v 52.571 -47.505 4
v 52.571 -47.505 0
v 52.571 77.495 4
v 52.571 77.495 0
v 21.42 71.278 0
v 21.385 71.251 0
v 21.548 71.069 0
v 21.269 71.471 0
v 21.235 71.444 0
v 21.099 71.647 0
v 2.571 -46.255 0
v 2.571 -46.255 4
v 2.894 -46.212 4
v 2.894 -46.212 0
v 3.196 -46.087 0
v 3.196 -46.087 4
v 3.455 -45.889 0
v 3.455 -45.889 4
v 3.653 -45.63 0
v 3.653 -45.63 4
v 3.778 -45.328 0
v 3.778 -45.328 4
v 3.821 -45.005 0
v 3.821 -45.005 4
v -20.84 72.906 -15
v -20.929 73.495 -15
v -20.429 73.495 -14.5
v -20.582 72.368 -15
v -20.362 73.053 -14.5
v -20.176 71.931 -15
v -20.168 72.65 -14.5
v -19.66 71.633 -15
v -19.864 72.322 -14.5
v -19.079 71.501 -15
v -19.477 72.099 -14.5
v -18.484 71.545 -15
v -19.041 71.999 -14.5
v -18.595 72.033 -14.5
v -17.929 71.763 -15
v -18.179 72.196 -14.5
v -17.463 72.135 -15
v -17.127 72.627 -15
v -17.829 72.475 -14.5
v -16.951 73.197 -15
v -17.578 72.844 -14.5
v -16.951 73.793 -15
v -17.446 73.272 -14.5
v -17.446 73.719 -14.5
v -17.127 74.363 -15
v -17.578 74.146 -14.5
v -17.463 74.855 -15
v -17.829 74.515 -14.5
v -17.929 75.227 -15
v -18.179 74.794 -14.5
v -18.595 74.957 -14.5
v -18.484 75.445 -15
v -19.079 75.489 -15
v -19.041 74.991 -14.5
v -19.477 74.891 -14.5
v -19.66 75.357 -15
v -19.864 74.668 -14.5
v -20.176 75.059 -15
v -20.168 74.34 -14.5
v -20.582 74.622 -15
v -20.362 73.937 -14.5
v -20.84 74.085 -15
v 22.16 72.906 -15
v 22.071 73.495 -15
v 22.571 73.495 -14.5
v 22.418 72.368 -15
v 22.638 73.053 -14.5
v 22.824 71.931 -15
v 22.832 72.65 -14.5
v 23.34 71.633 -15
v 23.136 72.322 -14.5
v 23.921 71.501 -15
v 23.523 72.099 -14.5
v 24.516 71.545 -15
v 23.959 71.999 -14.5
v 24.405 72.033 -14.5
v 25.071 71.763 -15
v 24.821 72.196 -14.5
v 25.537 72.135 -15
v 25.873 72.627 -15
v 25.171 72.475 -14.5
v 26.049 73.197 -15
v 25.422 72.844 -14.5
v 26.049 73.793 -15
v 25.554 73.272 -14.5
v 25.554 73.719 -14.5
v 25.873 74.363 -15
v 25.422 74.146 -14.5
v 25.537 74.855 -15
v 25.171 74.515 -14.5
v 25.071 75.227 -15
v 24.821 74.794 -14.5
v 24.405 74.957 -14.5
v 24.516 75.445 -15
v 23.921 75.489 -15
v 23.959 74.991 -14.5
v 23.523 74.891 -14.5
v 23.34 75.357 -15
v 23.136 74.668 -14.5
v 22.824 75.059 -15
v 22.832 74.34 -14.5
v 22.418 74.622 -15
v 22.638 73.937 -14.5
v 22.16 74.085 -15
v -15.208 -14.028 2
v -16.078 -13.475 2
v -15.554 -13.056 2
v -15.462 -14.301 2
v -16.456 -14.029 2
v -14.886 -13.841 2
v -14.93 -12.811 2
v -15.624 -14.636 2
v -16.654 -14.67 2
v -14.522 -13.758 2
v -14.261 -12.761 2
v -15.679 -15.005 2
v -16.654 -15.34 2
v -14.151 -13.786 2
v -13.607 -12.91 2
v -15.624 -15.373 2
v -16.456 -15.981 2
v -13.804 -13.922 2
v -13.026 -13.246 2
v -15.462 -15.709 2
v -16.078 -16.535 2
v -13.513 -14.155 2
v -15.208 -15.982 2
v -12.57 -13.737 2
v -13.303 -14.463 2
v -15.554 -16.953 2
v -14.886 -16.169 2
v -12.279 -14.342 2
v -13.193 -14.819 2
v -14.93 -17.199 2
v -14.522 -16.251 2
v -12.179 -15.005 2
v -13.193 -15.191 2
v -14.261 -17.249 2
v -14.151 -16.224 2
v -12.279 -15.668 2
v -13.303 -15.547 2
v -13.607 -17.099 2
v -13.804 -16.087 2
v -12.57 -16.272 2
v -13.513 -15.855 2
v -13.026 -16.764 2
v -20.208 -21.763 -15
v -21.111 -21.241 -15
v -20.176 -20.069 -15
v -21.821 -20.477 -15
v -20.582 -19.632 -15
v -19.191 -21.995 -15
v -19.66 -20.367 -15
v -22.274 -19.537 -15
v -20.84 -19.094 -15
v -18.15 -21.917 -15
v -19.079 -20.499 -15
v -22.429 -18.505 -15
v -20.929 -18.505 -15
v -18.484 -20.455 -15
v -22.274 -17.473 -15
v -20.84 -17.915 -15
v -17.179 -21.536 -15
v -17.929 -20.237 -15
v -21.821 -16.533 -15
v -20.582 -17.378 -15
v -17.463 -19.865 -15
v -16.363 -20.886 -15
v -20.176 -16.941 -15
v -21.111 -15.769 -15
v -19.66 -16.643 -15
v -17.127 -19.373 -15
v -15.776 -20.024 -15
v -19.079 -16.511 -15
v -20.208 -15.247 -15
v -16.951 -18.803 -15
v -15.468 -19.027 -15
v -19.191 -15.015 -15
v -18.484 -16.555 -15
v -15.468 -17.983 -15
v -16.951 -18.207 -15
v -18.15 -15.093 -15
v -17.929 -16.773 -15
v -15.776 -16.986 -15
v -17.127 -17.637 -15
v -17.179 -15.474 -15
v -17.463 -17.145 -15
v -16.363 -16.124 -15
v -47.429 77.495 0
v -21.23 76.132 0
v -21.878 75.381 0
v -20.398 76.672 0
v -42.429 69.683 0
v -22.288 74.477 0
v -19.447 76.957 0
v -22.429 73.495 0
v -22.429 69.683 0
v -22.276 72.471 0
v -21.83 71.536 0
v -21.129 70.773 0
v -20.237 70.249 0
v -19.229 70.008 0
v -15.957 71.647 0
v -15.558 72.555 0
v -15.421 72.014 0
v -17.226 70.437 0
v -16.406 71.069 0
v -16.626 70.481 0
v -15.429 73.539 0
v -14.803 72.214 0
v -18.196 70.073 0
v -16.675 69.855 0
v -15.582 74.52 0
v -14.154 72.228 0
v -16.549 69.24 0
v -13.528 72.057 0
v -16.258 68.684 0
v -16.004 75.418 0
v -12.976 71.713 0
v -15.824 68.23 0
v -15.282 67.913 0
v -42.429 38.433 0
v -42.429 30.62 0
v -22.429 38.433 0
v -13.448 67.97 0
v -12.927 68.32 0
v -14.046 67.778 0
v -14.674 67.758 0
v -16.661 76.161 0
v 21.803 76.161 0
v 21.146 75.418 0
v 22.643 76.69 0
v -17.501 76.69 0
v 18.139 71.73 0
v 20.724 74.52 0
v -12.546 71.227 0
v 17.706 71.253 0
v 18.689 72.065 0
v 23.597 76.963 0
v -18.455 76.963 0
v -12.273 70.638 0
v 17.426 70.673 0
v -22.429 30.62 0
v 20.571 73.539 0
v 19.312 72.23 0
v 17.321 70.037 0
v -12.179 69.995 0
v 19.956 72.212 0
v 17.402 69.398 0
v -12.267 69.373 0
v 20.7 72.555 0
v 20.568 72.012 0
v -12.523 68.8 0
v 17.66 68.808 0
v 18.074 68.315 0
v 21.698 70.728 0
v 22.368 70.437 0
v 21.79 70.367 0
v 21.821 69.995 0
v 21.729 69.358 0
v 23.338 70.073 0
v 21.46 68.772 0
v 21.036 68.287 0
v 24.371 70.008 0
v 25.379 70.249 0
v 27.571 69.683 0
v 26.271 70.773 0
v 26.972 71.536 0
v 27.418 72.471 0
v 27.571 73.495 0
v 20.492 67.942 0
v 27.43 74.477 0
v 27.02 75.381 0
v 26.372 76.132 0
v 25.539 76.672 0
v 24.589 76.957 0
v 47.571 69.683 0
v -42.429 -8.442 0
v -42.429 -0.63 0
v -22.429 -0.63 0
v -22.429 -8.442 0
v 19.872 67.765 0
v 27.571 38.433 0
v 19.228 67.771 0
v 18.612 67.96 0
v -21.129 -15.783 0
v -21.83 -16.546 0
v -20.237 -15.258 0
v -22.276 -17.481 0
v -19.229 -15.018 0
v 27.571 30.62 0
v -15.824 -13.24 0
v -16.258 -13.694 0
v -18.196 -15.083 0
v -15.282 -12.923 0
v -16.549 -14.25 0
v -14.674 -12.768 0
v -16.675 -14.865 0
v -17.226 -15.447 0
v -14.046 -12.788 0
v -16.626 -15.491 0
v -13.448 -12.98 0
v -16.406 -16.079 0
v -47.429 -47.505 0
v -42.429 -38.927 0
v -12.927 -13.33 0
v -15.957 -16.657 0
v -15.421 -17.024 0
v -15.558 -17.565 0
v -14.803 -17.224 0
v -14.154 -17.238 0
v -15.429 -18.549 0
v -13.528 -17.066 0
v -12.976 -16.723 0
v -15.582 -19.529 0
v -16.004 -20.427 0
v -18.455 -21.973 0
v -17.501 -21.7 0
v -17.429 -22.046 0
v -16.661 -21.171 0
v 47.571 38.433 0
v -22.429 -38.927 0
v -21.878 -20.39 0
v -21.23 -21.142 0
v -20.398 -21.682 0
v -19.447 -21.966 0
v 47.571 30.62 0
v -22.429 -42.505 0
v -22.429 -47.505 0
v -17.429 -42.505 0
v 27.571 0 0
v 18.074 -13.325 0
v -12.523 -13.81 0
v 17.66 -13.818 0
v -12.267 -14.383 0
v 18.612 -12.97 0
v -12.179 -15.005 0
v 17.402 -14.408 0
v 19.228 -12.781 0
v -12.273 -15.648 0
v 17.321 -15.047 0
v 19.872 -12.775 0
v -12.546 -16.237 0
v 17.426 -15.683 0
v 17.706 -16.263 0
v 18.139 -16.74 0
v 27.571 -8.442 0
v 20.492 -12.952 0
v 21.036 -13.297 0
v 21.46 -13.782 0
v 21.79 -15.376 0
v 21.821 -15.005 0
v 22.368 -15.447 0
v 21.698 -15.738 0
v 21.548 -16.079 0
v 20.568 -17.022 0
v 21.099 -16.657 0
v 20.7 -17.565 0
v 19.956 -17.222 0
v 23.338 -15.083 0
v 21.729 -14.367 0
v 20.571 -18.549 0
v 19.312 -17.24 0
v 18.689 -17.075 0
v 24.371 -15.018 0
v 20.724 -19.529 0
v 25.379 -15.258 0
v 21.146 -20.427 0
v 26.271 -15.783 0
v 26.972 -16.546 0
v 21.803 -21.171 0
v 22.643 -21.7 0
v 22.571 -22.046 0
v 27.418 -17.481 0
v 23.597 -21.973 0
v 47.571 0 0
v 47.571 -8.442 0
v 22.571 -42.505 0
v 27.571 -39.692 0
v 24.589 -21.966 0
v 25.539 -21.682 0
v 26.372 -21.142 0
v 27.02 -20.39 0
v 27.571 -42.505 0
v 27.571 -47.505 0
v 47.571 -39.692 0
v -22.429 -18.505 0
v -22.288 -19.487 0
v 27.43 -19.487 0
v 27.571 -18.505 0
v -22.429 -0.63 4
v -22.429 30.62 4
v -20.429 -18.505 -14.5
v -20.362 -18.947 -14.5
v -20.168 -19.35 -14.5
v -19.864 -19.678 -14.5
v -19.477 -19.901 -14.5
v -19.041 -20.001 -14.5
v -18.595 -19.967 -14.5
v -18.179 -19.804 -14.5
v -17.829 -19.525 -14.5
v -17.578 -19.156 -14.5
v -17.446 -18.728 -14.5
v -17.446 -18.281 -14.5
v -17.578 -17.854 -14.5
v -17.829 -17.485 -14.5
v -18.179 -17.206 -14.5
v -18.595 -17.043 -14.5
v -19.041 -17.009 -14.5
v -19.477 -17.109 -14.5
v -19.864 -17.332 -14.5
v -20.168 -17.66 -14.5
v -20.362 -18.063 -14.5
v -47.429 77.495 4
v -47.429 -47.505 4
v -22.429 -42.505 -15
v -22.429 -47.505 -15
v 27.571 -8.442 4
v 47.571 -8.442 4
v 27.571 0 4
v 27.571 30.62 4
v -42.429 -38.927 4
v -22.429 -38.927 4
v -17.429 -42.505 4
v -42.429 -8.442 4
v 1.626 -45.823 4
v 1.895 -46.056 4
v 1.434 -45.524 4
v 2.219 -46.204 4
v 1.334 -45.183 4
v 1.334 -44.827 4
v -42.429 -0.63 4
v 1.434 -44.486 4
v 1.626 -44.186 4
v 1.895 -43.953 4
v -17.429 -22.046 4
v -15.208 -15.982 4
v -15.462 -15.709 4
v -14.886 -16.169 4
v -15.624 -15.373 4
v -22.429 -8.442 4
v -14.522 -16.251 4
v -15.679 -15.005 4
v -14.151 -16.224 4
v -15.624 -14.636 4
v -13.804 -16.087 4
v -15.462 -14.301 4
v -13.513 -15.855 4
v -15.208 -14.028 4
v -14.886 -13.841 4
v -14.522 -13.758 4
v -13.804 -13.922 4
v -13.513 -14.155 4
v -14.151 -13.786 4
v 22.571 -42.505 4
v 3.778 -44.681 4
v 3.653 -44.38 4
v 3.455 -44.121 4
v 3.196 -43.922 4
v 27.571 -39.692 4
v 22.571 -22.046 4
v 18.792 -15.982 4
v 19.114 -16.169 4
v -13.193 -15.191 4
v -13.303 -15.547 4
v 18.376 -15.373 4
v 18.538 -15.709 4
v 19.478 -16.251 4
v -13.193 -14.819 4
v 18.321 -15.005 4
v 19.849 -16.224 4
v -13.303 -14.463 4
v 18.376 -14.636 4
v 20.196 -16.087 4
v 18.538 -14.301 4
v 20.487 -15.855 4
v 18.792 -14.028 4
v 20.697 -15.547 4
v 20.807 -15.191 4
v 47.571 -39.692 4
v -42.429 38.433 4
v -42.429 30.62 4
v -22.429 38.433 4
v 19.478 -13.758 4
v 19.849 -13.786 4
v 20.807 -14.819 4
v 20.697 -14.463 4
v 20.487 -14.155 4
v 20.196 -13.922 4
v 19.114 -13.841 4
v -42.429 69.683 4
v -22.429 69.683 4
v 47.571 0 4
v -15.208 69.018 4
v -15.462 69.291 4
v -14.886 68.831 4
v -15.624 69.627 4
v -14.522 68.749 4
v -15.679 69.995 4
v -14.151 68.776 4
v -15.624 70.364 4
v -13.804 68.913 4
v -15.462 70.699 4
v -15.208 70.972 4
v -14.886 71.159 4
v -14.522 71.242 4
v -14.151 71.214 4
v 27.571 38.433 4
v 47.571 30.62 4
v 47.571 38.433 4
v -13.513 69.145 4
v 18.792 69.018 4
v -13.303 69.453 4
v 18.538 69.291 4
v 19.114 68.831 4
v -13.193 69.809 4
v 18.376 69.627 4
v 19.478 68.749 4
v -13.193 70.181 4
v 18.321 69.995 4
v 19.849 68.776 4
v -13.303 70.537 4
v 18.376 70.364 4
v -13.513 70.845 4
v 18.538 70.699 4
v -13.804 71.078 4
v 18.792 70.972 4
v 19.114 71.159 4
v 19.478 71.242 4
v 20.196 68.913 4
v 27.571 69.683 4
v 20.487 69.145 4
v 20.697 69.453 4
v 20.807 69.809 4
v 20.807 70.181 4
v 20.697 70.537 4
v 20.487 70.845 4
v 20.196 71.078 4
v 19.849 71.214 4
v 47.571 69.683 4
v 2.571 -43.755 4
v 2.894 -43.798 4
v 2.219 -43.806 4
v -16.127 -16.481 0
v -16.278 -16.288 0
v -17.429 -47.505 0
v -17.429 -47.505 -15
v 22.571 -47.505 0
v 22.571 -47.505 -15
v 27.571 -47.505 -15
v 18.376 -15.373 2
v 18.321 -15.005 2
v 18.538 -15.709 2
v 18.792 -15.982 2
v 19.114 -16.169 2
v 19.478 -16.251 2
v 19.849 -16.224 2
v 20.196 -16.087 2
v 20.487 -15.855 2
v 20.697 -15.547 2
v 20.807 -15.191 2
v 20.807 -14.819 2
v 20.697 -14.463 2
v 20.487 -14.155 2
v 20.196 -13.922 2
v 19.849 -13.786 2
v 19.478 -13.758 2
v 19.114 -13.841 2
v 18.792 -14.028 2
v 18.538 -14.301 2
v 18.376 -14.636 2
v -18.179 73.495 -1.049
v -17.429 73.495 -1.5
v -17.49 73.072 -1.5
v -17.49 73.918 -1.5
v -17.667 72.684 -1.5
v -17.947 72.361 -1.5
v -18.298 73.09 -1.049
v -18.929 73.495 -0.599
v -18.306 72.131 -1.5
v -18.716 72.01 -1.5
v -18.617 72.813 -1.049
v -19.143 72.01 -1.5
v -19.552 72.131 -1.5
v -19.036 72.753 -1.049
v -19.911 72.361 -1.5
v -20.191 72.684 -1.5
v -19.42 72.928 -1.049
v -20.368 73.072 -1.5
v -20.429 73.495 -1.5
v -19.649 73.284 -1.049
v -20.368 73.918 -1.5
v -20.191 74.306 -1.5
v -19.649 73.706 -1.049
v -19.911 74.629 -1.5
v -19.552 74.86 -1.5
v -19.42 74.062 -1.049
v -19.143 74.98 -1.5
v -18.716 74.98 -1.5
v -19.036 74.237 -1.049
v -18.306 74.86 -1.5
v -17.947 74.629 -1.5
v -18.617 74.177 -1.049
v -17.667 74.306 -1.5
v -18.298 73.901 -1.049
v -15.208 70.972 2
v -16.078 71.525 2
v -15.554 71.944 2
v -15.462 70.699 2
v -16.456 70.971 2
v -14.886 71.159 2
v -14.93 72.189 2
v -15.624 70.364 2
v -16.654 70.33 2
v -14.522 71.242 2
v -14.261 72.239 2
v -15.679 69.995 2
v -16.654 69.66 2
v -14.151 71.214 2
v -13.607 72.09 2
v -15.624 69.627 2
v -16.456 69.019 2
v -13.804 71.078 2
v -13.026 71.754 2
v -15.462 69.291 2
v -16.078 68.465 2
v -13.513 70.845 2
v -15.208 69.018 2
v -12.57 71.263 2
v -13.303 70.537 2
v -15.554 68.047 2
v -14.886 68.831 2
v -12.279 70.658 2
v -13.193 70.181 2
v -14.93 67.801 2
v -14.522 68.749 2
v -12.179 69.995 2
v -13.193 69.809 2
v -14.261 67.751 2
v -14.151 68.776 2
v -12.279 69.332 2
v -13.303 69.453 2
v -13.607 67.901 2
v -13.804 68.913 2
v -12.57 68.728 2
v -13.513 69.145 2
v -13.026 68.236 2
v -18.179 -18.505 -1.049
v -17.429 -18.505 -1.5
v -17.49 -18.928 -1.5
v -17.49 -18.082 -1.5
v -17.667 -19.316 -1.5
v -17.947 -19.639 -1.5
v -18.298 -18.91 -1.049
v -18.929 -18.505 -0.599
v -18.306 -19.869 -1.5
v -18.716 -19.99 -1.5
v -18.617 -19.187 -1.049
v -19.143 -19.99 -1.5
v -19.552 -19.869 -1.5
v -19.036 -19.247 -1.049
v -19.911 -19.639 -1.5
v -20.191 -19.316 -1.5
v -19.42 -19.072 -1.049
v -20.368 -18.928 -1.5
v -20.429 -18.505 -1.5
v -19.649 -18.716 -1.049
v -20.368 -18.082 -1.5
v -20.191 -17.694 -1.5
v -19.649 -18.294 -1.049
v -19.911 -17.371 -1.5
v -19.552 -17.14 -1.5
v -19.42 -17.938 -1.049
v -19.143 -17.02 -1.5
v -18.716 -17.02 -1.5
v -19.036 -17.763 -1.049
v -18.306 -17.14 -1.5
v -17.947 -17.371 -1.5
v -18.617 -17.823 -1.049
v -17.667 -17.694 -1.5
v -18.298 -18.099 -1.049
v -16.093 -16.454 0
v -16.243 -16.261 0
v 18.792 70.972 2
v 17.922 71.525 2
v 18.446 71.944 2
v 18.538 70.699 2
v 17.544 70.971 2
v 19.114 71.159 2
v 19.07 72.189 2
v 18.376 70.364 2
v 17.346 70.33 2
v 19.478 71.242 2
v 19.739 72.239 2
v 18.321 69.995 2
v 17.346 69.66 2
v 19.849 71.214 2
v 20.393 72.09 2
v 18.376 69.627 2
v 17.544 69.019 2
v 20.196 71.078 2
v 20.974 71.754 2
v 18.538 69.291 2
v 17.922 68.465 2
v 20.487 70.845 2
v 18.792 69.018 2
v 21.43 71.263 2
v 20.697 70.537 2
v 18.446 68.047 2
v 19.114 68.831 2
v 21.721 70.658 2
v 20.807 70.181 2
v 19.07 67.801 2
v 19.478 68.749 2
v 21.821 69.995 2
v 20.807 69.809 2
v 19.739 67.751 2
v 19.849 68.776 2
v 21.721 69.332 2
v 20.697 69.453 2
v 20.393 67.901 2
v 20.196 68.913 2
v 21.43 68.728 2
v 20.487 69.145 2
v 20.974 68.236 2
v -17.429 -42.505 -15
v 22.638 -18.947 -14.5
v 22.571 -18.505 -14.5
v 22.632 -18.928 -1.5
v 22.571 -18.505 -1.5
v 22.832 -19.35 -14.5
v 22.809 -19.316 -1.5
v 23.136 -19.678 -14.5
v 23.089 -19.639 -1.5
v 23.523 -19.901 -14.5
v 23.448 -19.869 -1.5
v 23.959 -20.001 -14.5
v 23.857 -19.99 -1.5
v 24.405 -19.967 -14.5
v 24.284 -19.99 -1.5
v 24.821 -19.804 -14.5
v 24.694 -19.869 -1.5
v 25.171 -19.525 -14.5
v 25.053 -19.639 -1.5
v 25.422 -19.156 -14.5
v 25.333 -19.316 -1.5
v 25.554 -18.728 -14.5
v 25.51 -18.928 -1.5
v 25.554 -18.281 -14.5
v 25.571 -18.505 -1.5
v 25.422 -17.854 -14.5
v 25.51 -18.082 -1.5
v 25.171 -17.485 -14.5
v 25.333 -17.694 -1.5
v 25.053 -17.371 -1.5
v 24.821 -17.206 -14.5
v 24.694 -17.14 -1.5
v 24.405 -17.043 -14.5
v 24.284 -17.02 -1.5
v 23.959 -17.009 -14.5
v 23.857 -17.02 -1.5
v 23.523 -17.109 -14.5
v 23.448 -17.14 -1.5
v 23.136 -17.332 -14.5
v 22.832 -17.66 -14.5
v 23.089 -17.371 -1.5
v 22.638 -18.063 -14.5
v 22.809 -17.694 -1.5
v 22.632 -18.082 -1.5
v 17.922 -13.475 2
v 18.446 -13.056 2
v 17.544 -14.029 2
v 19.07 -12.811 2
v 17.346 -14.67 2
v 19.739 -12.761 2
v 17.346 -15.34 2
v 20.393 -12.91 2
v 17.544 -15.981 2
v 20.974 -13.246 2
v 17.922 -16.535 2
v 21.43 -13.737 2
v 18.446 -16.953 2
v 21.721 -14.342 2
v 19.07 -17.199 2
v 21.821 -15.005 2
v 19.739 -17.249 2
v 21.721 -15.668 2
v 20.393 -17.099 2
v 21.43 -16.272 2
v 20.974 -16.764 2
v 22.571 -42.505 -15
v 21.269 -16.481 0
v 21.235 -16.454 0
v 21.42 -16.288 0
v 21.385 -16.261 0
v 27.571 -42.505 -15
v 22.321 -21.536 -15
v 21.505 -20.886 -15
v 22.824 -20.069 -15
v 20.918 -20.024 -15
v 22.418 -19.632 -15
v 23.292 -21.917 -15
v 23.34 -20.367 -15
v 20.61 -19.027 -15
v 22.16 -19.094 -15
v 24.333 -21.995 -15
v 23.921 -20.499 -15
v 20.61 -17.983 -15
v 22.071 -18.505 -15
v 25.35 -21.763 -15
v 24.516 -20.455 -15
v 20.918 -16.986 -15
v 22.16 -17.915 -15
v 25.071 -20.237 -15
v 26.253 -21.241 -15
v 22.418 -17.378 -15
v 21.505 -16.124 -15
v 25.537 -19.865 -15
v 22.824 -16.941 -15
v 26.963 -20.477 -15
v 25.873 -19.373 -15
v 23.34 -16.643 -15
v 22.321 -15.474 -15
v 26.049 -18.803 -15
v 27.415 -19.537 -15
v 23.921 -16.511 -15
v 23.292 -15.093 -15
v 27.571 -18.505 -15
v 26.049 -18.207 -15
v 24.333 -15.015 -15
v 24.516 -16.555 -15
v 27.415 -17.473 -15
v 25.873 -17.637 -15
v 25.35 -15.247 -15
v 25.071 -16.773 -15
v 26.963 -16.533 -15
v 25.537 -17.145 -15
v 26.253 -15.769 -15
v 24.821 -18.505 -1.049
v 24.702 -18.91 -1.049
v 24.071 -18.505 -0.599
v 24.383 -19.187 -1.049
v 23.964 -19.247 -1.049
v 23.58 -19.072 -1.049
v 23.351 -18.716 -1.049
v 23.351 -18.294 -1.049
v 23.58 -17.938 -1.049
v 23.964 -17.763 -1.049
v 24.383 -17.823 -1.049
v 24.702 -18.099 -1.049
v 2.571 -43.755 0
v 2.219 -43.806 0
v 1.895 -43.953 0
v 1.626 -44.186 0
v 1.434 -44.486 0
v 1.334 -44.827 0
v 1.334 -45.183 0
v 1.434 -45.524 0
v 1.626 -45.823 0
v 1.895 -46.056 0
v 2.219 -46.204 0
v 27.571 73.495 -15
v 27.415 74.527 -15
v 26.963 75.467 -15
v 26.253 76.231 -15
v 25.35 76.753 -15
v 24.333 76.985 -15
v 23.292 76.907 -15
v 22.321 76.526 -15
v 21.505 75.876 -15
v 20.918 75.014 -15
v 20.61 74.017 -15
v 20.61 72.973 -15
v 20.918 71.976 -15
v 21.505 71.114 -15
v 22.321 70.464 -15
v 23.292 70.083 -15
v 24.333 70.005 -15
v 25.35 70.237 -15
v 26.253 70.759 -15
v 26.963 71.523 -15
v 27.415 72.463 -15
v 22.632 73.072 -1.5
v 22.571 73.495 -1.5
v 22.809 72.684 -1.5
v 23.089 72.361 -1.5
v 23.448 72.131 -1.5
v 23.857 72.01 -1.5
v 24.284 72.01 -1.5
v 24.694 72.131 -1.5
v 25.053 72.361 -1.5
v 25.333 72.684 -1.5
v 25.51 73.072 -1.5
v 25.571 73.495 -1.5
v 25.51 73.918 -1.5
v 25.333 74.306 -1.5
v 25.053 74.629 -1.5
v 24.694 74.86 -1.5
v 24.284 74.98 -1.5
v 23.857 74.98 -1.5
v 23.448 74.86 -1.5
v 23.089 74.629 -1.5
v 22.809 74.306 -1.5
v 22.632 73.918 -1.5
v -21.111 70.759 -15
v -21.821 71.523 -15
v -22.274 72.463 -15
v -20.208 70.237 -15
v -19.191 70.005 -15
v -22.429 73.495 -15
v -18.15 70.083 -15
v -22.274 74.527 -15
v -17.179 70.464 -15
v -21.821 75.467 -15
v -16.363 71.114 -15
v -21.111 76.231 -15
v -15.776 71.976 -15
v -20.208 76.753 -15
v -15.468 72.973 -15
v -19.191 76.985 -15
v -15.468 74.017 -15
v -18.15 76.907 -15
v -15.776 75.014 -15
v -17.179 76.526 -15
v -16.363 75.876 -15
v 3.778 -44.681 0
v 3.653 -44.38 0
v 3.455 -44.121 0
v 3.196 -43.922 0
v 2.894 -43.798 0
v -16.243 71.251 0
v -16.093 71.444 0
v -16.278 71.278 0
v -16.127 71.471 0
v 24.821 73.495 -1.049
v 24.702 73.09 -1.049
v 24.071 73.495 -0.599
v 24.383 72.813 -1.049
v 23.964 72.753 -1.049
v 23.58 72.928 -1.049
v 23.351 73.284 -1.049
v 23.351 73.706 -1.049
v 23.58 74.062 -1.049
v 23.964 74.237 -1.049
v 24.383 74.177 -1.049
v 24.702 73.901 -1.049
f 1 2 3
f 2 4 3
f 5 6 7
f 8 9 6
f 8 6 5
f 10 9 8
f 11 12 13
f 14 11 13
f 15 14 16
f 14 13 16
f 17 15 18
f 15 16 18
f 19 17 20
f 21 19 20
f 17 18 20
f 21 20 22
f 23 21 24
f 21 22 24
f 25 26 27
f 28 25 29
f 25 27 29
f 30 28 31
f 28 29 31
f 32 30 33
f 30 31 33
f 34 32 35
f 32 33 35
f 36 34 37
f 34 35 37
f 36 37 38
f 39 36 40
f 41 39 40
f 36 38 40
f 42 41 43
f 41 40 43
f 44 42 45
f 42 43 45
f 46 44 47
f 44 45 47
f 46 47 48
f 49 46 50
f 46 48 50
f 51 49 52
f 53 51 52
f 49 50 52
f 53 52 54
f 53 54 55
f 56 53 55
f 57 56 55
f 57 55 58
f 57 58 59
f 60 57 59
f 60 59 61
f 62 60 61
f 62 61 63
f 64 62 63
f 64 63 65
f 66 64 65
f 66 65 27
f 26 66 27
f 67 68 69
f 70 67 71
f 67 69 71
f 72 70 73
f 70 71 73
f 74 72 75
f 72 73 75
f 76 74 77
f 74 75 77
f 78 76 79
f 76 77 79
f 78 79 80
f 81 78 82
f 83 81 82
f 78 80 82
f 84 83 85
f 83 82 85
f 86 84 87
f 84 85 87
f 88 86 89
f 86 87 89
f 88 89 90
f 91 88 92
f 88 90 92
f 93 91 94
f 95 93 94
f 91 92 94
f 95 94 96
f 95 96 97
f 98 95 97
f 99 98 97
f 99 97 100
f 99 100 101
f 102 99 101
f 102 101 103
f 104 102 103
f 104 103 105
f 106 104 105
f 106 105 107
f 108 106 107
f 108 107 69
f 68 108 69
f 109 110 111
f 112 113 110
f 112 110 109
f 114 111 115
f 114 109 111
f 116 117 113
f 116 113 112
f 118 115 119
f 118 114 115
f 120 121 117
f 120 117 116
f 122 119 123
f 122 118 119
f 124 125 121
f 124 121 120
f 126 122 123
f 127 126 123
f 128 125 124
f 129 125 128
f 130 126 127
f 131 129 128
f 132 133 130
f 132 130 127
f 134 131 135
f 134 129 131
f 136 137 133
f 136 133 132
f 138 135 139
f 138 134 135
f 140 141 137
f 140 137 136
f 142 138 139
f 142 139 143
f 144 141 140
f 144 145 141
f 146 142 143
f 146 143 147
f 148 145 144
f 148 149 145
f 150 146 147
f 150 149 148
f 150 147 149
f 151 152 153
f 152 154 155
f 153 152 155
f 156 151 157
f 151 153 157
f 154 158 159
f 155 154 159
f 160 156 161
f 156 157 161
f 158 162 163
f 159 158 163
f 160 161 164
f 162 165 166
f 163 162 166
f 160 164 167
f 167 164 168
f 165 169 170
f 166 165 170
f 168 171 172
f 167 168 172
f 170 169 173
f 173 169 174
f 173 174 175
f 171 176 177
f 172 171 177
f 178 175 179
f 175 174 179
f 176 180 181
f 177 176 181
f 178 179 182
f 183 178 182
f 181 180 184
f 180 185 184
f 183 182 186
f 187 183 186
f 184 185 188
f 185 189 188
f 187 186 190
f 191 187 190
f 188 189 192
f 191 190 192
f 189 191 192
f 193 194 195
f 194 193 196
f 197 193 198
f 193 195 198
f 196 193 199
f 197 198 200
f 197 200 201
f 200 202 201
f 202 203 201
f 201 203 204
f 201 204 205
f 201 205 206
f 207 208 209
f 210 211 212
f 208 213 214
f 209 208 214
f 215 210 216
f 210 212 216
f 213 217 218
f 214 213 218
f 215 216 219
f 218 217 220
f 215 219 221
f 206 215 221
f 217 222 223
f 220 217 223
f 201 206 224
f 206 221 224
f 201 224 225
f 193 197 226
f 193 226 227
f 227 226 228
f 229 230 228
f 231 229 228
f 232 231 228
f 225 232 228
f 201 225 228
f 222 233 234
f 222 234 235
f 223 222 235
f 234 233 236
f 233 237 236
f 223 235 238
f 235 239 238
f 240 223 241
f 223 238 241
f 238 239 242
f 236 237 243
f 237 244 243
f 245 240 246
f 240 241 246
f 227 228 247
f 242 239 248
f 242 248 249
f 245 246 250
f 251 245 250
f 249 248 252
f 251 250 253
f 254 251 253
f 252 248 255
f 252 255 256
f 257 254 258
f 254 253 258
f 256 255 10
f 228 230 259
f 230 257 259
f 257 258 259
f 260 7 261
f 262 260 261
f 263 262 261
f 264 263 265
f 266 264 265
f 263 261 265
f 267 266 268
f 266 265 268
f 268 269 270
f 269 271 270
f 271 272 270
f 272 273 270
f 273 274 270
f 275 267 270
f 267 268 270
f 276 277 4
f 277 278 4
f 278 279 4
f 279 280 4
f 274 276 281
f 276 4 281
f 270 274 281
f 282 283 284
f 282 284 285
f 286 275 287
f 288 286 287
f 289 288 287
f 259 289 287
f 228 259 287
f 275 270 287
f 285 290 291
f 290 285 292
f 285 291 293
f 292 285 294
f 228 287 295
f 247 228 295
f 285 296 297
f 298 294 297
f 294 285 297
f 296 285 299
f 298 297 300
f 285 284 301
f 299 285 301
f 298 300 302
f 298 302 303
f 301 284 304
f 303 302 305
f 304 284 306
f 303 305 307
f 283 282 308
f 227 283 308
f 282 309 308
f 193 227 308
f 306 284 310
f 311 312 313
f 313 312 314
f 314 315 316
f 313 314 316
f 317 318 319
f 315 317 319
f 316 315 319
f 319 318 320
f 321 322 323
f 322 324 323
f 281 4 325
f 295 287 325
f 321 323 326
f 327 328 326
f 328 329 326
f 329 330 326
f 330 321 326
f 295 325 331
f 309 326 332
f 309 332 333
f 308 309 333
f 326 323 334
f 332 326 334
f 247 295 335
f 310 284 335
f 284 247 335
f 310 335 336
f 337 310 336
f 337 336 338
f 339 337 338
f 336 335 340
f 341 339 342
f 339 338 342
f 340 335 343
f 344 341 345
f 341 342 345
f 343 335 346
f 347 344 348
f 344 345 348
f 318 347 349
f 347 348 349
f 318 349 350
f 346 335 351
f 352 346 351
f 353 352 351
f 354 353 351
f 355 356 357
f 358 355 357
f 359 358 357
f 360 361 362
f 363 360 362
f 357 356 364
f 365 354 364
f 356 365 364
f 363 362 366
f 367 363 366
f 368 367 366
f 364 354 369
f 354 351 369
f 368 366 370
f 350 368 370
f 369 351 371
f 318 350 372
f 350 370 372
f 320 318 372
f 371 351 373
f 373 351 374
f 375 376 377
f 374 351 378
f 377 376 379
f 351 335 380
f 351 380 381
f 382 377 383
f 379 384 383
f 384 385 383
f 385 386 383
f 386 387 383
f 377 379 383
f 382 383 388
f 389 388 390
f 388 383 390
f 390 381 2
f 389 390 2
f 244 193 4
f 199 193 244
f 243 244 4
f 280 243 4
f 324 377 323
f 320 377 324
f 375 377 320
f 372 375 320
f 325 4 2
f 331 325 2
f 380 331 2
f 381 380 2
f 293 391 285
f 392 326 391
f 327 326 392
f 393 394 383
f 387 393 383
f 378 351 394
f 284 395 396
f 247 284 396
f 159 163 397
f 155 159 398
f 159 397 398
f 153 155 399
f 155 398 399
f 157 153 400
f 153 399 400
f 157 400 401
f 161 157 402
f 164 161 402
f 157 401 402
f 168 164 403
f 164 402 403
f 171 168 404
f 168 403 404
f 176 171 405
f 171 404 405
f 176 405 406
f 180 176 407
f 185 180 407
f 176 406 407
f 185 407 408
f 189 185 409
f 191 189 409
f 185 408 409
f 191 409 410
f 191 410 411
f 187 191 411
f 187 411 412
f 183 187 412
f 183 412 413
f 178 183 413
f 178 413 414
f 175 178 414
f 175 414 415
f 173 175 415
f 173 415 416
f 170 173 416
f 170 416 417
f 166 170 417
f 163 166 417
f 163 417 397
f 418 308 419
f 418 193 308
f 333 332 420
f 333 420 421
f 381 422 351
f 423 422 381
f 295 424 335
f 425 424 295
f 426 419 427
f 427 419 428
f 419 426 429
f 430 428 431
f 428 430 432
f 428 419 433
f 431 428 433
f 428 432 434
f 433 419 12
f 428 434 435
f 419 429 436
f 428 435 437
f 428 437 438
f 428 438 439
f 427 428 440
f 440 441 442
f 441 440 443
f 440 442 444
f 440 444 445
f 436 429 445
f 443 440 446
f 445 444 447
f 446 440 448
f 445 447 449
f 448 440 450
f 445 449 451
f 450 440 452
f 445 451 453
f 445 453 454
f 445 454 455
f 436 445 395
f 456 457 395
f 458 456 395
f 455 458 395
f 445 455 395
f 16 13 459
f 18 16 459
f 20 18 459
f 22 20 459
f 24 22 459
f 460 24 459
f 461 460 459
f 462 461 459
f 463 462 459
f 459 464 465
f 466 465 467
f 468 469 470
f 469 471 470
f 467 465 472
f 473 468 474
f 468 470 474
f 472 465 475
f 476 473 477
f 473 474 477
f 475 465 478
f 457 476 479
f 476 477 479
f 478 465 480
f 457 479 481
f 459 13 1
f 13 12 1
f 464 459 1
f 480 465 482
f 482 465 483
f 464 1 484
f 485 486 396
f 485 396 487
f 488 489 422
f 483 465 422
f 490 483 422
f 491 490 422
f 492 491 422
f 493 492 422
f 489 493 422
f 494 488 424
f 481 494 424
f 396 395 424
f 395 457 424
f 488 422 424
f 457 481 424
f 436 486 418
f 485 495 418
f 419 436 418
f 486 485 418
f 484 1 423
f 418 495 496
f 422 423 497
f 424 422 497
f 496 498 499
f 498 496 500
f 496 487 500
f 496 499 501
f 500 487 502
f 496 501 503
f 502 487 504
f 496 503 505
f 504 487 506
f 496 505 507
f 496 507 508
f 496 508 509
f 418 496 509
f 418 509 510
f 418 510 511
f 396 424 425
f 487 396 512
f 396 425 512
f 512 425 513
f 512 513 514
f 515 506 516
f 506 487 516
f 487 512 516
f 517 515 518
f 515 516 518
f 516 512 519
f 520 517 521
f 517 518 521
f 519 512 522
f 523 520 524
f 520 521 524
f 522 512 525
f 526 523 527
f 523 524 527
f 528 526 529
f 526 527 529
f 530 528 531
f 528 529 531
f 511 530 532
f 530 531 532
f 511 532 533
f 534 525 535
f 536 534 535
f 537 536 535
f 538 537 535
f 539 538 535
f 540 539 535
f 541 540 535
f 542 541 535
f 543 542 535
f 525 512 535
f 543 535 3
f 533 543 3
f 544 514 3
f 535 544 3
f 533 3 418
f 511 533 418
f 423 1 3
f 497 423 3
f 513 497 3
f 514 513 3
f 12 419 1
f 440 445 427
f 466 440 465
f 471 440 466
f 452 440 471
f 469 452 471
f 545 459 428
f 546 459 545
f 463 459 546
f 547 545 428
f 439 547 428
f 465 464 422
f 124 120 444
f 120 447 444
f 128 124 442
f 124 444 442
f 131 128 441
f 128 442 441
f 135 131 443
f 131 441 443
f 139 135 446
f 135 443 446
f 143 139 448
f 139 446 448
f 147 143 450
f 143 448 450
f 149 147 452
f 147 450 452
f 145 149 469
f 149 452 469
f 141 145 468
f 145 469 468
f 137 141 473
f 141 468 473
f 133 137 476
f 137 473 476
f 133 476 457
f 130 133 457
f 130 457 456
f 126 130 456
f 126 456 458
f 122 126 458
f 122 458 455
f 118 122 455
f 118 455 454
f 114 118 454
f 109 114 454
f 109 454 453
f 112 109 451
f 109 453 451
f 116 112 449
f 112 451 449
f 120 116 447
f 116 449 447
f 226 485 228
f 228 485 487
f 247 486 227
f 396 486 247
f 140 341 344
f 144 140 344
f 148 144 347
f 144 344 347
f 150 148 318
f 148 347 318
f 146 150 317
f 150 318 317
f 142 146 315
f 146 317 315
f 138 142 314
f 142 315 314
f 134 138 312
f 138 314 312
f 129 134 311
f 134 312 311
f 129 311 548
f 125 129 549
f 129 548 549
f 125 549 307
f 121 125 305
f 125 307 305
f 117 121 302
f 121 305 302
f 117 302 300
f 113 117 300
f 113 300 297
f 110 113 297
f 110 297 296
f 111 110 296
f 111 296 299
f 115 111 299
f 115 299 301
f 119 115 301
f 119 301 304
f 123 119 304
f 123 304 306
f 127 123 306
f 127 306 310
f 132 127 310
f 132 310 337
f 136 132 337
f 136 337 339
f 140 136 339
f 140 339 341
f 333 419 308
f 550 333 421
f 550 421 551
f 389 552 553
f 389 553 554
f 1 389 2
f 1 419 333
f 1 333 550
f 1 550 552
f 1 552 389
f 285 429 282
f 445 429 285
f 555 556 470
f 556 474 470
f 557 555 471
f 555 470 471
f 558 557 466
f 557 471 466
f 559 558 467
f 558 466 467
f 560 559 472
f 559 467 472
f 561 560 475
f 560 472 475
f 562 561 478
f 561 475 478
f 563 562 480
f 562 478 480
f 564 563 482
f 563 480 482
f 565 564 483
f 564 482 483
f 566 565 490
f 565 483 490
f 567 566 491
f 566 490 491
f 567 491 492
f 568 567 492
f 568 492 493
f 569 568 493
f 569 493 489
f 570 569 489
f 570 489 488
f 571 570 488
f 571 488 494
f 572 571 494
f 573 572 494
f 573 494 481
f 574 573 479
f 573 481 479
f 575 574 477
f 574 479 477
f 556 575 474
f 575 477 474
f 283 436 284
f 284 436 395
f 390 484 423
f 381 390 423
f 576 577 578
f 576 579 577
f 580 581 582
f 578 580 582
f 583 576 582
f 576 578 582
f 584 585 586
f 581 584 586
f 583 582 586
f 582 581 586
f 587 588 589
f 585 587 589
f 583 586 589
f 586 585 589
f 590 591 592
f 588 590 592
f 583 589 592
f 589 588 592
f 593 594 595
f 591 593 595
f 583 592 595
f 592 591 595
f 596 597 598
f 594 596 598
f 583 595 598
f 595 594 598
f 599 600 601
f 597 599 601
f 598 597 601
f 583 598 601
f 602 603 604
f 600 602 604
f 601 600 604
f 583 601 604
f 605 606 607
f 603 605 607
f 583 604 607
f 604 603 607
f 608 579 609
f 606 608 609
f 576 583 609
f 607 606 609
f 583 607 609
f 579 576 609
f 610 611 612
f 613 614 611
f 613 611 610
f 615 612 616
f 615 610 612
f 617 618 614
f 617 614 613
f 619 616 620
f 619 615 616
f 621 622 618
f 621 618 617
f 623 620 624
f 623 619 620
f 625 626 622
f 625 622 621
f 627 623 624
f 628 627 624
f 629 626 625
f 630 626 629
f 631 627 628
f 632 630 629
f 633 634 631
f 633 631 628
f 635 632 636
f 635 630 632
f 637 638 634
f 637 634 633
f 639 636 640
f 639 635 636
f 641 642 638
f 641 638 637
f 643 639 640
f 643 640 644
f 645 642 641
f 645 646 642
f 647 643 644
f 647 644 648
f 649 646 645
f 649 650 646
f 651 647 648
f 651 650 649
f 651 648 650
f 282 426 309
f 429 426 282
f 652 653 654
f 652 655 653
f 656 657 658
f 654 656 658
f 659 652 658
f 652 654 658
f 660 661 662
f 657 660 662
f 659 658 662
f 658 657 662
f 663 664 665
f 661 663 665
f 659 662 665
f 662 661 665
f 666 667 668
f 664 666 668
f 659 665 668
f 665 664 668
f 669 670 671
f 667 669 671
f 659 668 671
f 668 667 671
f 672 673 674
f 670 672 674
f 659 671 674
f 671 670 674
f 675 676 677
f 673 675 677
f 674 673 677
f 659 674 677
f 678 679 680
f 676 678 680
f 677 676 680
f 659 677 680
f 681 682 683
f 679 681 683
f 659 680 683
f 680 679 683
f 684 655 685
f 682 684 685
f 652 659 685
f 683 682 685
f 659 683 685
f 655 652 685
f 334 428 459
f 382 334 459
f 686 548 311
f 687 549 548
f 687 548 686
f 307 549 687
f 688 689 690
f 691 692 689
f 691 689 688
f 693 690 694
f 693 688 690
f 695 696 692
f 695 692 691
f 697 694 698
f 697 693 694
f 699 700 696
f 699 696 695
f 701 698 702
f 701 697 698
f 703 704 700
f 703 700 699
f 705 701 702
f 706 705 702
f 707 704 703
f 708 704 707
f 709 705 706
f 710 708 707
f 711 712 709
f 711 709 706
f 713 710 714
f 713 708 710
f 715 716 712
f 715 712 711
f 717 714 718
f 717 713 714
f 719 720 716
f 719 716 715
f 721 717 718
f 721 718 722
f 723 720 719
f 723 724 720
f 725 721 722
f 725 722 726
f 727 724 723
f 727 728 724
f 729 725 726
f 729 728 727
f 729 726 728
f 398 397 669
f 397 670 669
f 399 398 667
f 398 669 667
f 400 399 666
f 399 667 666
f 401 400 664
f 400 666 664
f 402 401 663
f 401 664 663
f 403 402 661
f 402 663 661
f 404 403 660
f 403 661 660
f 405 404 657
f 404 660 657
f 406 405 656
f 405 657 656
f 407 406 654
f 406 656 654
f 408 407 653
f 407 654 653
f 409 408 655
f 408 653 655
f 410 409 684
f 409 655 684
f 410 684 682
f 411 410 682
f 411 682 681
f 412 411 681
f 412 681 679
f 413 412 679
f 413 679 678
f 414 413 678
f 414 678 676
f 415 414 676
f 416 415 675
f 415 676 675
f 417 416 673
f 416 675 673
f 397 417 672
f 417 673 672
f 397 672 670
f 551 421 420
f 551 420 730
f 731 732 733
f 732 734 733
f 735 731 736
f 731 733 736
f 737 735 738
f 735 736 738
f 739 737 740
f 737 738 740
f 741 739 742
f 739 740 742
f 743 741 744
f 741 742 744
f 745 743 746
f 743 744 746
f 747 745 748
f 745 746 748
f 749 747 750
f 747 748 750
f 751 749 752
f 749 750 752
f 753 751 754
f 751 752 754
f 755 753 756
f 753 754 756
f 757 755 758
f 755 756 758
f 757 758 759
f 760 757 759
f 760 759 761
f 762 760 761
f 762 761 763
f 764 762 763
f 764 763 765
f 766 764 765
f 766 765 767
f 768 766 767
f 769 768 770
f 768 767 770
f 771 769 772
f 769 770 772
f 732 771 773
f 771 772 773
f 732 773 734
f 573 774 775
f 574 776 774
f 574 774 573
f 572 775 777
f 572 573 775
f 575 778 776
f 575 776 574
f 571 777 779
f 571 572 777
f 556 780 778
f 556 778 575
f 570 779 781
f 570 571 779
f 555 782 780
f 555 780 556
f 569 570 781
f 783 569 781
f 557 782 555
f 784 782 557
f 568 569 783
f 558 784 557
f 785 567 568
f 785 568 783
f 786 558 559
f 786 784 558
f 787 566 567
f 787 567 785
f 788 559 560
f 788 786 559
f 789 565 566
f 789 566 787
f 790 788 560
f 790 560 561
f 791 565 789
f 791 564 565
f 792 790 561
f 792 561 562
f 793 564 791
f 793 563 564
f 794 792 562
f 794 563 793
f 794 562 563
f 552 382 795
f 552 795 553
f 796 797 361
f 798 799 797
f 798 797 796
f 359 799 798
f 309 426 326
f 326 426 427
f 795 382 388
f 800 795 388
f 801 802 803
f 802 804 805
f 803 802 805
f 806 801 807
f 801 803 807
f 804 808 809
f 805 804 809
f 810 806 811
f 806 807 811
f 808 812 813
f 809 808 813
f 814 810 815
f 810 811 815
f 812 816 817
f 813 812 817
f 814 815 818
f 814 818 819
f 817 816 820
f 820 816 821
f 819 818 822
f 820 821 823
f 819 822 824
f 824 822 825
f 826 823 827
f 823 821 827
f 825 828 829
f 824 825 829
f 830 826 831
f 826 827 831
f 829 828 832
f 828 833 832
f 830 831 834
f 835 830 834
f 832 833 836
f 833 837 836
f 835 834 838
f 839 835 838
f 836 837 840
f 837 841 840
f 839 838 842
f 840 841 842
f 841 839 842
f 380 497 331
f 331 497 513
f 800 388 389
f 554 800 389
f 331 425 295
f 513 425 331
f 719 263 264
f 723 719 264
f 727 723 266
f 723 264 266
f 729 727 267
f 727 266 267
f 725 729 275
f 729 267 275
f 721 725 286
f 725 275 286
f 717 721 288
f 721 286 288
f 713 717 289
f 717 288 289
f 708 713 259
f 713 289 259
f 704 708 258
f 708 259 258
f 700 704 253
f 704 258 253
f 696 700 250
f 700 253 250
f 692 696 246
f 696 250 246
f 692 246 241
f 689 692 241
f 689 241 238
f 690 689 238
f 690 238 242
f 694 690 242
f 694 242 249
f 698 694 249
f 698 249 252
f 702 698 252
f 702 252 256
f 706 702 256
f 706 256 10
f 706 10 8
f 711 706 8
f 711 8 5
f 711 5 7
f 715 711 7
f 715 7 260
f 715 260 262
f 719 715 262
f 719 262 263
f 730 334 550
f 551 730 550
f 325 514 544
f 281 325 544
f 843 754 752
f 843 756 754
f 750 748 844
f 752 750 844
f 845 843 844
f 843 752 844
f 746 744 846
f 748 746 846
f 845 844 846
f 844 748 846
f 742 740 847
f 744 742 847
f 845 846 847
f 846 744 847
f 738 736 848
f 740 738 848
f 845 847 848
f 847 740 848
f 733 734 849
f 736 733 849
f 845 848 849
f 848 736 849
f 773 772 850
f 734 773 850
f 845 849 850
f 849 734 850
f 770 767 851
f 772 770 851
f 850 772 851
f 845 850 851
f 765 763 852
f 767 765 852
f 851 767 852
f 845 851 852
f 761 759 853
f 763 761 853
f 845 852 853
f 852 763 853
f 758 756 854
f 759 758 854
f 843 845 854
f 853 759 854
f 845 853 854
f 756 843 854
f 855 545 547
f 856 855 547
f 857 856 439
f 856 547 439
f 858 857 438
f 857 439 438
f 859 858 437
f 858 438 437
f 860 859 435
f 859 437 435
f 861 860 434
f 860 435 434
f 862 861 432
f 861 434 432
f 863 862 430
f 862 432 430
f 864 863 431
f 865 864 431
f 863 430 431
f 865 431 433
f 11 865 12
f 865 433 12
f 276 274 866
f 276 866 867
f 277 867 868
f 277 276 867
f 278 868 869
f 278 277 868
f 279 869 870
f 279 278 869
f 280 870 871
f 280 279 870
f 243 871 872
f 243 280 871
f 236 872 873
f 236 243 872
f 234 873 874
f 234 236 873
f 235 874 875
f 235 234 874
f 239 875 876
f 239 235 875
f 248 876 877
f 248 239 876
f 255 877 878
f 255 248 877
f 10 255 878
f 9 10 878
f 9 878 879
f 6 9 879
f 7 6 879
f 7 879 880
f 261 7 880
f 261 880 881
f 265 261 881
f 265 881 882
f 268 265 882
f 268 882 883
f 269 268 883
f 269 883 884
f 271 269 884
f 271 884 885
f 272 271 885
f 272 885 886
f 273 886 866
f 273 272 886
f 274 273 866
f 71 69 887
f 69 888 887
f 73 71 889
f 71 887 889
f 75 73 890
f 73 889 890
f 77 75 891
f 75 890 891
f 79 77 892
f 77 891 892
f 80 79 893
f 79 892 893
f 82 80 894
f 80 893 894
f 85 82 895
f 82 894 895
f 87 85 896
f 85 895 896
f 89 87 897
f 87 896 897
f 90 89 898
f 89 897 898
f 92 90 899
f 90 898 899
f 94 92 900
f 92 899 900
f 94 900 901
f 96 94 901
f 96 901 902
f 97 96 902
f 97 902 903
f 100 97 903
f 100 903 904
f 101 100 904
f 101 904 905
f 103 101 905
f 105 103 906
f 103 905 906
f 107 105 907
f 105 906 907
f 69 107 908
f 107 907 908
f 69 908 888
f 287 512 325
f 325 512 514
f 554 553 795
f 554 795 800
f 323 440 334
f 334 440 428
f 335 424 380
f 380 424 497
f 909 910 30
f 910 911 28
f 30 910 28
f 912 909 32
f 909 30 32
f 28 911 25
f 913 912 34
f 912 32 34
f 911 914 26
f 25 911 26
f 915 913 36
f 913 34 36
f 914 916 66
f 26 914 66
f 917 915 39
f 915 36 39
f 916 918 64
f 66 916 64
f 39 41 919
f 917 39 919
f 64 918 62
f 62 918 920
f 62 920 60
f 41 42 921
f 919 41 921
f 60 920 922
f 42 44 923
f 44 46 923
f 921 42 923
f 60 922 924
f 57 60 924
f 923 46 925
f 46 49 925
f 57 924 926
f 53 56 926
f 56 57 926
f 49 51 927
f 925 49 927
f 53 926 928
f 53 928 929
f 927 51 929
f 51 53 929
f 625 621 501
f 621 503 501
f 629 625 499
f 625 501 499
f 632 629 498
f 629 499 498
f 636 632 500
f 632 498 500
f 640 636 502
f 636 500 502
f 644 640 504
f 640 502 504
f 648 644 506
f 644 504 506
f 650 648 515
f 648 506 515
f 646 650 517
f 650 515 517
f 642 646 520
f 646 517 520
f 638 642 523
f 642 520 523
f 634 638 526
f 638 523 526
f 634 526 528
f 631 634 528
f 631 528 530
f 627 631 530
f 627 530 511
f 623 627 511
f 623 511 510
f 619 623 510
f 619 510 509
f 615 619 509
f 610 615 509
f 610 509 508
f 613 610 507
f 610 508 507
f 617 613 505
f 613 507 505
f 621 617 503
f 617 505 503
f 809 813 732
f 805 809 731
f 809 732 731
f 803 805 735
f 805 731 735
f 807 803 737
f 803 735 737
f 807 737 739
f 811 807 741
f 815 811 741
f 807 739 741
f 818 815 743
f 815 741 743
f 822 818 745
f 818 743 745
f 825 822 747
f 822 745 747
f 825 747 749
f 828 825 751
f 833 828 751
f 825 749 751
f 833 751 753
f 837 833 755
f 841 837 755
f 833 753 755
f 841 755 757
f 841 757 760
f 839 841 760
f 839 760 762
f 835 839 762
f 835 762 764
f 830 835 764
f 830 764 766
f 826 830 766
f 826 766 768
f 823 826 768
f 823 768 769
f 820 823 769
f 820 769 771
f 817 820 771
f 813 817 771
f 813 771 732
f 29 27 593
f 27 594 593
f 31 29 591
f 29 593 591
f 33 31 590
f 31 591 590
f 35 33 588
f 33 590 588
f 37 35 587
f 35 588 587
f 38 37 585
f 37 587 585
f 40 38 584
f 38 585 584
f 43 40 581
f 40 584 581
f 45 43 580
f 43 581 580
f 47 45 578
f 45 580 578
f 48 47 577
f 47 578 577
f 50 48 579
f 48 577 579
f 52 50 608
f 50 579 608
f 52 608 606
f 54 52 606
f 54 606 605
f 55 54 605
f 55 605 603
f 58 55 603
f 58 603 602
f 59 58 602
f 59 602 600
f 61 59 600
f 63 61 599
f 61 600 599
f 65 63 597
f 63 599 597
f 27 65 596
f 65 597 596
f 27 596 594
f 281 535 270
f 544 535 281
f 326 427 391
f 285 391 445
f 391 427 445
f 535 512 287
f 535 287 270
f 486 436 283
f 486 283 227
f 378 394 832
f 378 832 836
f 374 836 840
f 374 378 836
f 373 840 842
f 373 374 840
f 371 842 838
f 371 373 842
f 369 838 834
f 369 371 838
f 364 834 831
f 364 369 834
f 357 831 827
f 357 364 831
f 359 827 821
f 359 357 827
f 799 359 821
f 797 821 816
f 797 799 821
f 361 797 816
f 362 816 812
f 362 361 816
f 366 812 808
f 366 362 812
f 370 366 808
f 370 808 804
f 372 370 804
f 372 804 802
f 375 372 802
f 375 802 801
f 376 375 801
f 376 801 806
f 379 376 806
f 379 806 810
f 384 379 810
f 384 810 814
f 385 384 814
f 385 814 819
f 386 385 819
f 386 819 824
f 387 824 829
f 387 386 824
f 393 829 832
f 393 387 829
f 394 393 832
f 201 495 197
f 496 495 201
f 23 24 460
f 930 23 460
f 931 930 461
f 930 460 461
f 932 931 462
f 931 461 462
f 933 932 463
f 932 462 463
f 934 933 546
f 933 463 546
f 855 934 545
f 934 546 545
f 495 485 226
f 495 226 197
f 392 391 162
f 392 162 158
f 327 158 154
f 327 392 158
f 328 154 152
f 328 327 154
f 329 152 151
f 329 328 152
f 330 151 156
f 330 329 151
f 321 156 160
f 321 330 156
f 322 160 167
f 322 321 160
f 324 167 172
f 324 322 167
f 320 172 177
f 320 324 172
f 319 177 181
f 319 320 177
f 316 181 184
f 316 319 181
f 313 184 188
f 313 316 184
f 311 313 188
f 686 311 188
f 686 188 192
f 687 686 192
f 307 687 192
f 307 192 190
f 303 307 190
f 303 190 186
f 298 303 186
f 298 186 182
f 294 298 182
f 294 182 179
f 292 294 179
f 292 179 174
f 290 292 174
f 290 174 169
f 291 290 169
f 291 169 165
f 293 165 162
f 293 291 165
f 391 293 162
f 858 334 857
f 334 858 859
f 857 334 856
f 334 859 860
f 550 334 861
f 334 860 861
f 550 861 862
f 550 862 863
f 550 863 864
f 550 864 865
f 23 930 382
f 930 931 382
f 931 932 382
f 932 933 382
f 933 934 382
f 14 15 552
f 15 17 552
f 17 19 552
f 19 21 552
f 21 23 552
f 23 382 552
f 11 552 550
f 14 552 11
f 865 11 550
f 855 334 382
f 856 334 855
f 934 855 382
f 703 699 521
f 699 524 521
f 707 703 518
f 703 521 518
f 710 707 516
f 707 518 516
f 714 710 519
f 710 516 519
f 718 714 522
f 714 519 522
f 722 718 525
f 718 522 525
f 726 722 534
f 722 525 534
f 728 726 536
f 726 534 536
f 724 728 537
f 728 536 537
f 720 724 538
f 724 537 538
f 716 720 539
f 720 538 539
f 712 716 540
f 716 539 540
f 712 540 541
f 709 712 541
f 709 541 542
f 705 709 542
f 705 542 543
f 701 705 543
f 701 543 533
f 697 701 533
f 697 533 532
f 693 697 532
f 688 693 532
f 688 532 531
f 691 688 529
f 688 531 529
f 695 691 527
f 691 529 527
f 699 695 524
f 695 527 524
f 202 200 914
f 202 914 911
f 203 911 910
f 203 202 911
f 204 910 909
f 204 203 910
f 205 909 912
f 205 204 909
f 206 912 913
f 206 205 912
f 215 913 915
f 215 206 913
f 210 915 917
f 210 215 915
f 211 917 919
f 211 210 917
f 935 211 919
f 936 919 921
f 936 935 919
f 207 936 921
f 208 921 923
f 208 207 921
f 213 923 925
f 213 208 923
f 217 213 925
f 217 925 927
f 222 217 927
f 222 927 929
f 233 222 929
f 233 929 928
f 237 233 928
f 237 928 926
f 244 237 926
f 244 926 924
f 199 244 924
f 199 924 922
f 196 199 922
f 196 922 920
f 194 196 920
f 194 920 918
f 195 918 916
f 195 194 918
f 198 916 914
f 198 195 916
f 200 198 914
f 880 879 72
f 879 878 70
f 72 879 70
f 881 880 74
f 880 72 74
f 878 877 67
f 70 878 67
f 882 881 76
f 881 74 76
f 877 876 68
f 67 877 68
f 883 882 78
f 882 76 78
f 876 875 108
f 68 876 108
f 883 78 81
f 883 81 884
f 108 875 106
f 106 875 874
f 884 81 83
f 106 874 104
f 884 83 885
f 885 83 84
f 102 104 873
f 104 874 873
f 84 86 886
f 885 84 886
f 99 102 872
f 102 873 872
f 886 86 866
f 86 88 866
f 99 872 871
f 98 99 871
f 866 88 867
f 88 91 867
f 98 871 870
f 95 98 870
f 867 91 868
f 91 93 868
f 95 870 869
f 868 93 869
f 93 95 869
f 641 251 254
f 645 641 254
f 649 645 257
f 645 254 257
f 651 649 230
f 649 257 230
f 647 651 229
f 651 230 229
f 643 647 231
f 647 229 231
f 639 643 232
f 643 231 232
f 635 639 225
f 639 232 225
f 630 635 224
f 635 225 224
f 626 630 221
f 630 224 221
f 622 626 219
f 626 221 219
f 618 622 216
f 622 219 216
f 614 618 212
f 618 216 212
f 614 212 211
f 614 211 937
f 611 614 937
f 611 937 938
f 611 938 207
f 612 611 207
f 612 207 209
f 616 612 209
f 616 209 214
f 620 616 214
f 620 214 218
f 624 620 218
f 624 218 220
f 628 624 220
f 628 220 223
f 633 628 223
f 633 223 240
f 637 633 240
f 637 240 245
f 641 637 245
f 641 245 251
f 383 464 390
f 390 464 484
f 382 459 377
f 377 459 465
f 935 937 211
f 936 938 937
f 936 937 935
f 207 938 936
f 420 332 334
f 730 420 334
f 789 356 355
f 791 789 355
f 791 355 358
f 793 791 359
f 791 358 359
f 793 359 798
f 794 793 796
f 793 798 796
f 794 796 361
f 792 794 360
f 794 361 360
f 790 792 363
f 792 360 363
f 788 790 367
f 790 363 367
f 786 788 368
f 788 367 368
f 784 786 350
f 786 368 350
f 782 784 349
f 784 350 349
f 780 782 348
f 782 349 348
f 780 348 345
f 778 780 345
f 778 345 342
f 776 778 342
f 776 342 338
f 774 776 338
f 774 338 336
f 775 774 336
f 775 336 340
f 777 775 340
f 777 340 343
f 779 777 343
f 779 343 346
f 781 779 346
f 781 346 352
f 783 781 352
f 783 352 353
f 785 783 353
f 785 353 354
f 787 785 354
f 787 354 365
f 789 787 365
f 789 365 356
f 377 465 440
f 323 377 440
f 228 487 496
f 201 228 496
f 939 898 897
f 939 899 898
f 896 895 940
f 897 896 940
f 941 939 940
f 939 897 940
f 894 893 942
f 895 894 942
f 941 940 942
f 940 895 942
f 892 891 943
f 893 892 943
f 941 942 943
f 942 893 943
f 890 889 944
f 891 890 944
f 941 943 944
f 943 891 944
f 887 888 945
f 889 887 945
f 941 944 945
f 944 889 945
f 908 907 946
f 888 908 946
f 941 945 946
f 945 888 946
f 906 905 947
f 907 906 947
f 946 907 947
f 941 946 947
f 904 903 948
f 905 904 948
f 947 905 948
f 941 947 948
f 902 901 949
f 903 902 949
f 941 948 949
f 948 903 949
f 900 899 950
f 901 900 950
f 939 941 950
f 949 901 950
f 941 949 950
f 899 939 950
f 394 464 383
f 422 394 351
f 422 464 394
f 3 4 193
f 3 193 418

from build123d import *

# Parameters (mm, degrees)
F4_R            = 3.5
F5_DEPTH        = 4
F6_D            = 2.5
F6_CBORE_D      = 4.5
F6_CBORE_DEPTH  = 2
F7_DEPTH        = 15
F9_D            = 3
F9_DEPTH        = 13.5
F9_CSINK_D      = 4
F9_CSINK_ANGLE  = 90
F9_TIP          = 0.9012909285
F11_D           = 3
F11_DEPTH       = 13.5
F11_CSINK_D     = 4
F11_CSINK_ANGLE = 90
F11_TIP         = 0.9012909285
F13_D           = 3
F13_DEPTH       = 13.5
F13_CSINK_D     = 4
F13_CSINK_ANGLE = 90
F13_TIP         = 0.9012909285
F15_D           = 3
F15_DEPTH       = 13.5
F15_CSINK_D     = 4
F15_CSINK_ANGLE = 90
F15_TIP         = 0.9012909285
F16_DEPTH       = 25
F18_DEPTH       = 4
F20_DEPTH       = 25
F21_DEPTH       = 25
F22_W           = 20
F22_H           = 30.4843550548
F22_H_2         = 31.25
F22_H_3         = 30.620081059
F23_DEPTH       = 4
F19_W           = 5
F19_H           = 5
F24_DEPTH       = 15


with BuildPart() as f5:
    # F4 (on Top) → F5 (new body)
    with BuildSketch(Plane.XY):
        Polygon((27.5709562153, 77.495081059), (-22.4290437847, 77.495081059), (-22.4290437847, 73.495081059), (-22.4290437847, -18.5049188996), (-22.4290437847, -22.504918941), (27.5709562153, -22.504918941), (27.5709562153, -18.504918941), (27.5709562153, 73.495081059), align=None)
        with BuildLine():
            ThreePointArc((-15.4290437847, -18.504918941), (-18.9290438054, -22.004918941), (-22.4290437847, -18.5049188996))
            ThreePointArc((-22.4290437847, -18.5049188996), (-18.9290437641, -15.004918941), (-15.4290437847, -18.504918941))
        make_face(mode=Mode.SUBTRACT)
        with Locations((24.0709562153, -18.504918941)):
            Circle(F4_R, mode=Mode.SUBTRACT)
        with BuildLine():
            ThreePointArc((-15.4290437847, 73.495081059), (-18.9290437847, 69.995081059), (-22.4290437847, 73.495081059))
            ThreePointArc((-22.4290437847, 73.495081059), (-18.9290437847, 76.995081059), (-15.4290437847, 73.495081059))
        make_face(mode=Mode.SUBTRACT)
        with Locations((24.0709562153, 73.495081059)):
            Circle(F4_R, mode=Mode.SUBTRACT)
        with BuildLine():
            ThreePointArc((-15.4290437847, -18.504918941), (-18.9290437641, -15.004918941), (-22.4290437847, -18.5049188996))
            ThreePointArc((-22.4290437847, -18.5049188996), (-18.9290438054, -22.004918941), (-15.4290437847, -18.504918941))
        make_face()
        with Locations((24.0709562153, -18.504918941)):
            Circle(F4_R)
        with BuildLine():
            ThreePointArc((-15.4290437847, 73.495081059), (-18.9290437847, 76.995081059), (-22.4290437847, 73.495081059))
            ThreePointArc((-22.4290437847, 73.495081059), (-18.9290437847, 69.995081059), (-15.4290437847, 73.495081059))
        make_face()
        with Locations((24.0709562153, 73.495081059)):
            Circle(F4_R)
    extrude(amount=F5_DEPTH)

    # F6 (through all)
    with Locations(Plane(origin=(0, 0, 0), x_dir=(1, 0, 0), z_dir=(0, 0, -1))):
        with Locations((19.5709562153, -69.995081059), (19.5709562153, 15.004918941), (-14.4290437847, 15.004918941), (-14.4290437847, -69.995081059)):
            CounterBoreHole(F6_D / 2, F6_CBORE_D / 2, F6_CBORE_DEPTH)

    # F4 (on Top) → F7 (join)
    with BuildSketch(Plane.XY):
        with BuildLine():
            ThreePointArc((-15.4290437847, -18.504918941), (-18.9290437641, -15.004918941), (-22.4290437847, -18.5049188996))
            ThreePointArc((-22.4290437847, -18.5049188996), (-18.9290438054, -22.004918941), (-15.4290437847, -18.504918941))
        make_face()
        with Locations((24.0709562153, -18.504918941)):
            Circle(F4_R)
        with BuildLine():
            ThreePointArc((-15.4290437847, 73.495081059), (-18.9290437847, 76.995081059), (-22.4290437847, 73.495081059))
            ThreePointArc((-22.4290437847, 73.495081059), (-18.9290437847, 69.995081059), (-15.4290437847, 73.495081059))
        make_face()
        with Locations((24.0709562153, 73.495081059)):
            Circle(F4_R)
    extrude(amount=-F7_DEPTH)

    # F9
    with Locations(Plane(origin=(0, 0, -15), x_dir=(1, 0, 0), z_dir=(0, 0, -1))):
        with Locations((-18.9290437847, -73.495081059)):
            CounterSinkHole(F9_D / 2, F9_CSINK_D / 2, depth=F9_DEPTH, counter_sink_angle=F9_CSINK_ANGLE)
            with Locations((0, 0, -(F9_DEPTH + F9_TIP / 2))):  # 118° drill point
                Cone(0, F9_D / 2, F9_TIP, mode=Mode.SUBTRACT)

    # F11
    with Locations(Plane(origin=(0, 0, -15), x_dir=(1, 0, 0), z_dir=(0, 0, -1))):
        with Locations((-18.9290437847, 18.504918941)):
            CounterSinkHole(F11_D / 2, F11_CSINK_D / 2, depth=F11_DEPTH, counter_sink_angle=F11_CSINK_ANGLE)
            with Locations((0, 0, -(F11_DEPTH + F11_TIP / 2))):  # 118° drill point
                Cone(0, F11_D / 2, F11_TIP, mode=Mode.SUBTRACT)

    # F13
    with Locations(Plane(origin=(0, 0, -15), x_dir=(1, 0, 0), z_dir=(0, 0, -1))):
        with Locations((24.0709562153, -73.495081059)):
            CounterSinkHole(F13_D / 2, F13_CSINK_D / 2, depth=F13_DEPTH, counter_sink_angle=F13_CSINK_ANGLE)
            with Locations((0, 0, -(F13_DEPTH + F13_TIP / 2))):  # 118° drill point
                Cone(0, F13_D / 2, F13_TIP, mode=Mode.SUBTRACT)

    # F15
    with Locations(Plane(origin=(0, 0, -15), x_dir=(1, 0, 0), z_dir=(0, 0, -1))):
        with Locations((24.0709562153, 18.504918941)):
            CounterSinkHole(F15_D / 2, F15_CSINK_D / 2, depth=F15_DEPTH, counter_sink_angle=F15_CSINK_ANGLE)
            with Locations((0, 0, -(F15_DEPTH + F15_TIP / 2))):  # 118° drill point
                Cone(0, F15_D / 2, F15_TIP, mode=Mode.SUBTRACT)

    # F16 (add): a face of the model
    f16_faces = [f5.faces().sort_by_distance(p)[0] for p in [
        (2.5709562153, -22.504918941, 2),
    ]]
    extrude(f16_faces, amount=F16_DEPTH)

    # F17 (on face) → F18 (cut)
    with BuildSketch(Plane.XY.offset(4)):
        Polygon((2.5709562153, -42.504918941), (22.5709562153, -42.504918941), (22.5709562153, -22.0463977089), (-17.4290437847, -22.0463977089), (-17.4290437847, -42.504918941), align=None)
        with BuildLine():
            Line((2.5709562153, -46.254918941), (2.5709562153, -43.754918941))
            ThreePointArc((2.5709562153, -43.754918941), (1.3209562153, -45.004918941), (2.5709562153, -46.254918941))
        make_face()
        with BuildLine():
            ThreePointArc((3.8209562153, -45.004918941), (3.4548396917, -44.1210354645), (2.5709562153, -43.754918941))
            Line((2.5709562153, -43.754918941), (2.5709562153, -46.254918941))
            ThreePointArc((2.5709562153, -46.254918941), (3.4548396917, -45.8888024175), (3.8209562153, -45.004918941))
        make_face()
    extrude(amount=-F18_DEPTH, mode=Mode.SUBTRACT)

    # F20 (add): a face of the model
    f20_faces = [f5.faces().sort_by_distance(p)[0] for p in [
        (27.5709562153, 14.995081059, 2),
    ]]
    extrude(f20_faces, amount=F20_DEPTH)

    # F21 (add): a face of the model
    f21_faces = [f5.faces().sort_by_distance(p)[0] for p in [
        (-22.4290437847, 14.995081059, 2),
    ]]
    extrude(f21_faces, amount=F21_DEPTH)

    # F22 (on face) → F23 (cut)
    with BuildSketch(Plane.XY.offset(4)):
        with Locations((-32.4290437847, -23.6845964684)):
            Rectangle(F22_W, F22_H)
        with Locations((-32.4290437847, 14.995081059)):
            Rectangle(F22_W, F22_H_2)
        with Locations((-32.4290437847, 54.057581059)):
            Rectangle(F22_W, F22_H_2)
        with Locations((37.5709562153, 54.057581059)):
            Rectangle(F22_W, F22_H_2)
        with Locations((37.5709562153, 15.3100405295)):
            Rectangle(F22_W, F22_H_3)
        with Locations((37.5709562153, -24.067418941)):
            Rectangle(F22_W, F22_H_2)
    extrude(amount=-F23_DEPTH, mode=Mode.SUBTRACT)

    # F19 (on face) → F24 (join)
    with BuildSketch(Plane(origin=(0, 0, 0), x_dir=(1, 0, 0), z_dir=(0, 0, -1))):
        with Locations((-19.9290437847, 45.004918941)):
            Rectangle(F19_W, F19_H)
        with Locations((25.0709562153, 45.004918941)):
            Rectangle(F19_W, F19_H)
    extrude(amount=F24_DEPTH)


solid = f5.part
